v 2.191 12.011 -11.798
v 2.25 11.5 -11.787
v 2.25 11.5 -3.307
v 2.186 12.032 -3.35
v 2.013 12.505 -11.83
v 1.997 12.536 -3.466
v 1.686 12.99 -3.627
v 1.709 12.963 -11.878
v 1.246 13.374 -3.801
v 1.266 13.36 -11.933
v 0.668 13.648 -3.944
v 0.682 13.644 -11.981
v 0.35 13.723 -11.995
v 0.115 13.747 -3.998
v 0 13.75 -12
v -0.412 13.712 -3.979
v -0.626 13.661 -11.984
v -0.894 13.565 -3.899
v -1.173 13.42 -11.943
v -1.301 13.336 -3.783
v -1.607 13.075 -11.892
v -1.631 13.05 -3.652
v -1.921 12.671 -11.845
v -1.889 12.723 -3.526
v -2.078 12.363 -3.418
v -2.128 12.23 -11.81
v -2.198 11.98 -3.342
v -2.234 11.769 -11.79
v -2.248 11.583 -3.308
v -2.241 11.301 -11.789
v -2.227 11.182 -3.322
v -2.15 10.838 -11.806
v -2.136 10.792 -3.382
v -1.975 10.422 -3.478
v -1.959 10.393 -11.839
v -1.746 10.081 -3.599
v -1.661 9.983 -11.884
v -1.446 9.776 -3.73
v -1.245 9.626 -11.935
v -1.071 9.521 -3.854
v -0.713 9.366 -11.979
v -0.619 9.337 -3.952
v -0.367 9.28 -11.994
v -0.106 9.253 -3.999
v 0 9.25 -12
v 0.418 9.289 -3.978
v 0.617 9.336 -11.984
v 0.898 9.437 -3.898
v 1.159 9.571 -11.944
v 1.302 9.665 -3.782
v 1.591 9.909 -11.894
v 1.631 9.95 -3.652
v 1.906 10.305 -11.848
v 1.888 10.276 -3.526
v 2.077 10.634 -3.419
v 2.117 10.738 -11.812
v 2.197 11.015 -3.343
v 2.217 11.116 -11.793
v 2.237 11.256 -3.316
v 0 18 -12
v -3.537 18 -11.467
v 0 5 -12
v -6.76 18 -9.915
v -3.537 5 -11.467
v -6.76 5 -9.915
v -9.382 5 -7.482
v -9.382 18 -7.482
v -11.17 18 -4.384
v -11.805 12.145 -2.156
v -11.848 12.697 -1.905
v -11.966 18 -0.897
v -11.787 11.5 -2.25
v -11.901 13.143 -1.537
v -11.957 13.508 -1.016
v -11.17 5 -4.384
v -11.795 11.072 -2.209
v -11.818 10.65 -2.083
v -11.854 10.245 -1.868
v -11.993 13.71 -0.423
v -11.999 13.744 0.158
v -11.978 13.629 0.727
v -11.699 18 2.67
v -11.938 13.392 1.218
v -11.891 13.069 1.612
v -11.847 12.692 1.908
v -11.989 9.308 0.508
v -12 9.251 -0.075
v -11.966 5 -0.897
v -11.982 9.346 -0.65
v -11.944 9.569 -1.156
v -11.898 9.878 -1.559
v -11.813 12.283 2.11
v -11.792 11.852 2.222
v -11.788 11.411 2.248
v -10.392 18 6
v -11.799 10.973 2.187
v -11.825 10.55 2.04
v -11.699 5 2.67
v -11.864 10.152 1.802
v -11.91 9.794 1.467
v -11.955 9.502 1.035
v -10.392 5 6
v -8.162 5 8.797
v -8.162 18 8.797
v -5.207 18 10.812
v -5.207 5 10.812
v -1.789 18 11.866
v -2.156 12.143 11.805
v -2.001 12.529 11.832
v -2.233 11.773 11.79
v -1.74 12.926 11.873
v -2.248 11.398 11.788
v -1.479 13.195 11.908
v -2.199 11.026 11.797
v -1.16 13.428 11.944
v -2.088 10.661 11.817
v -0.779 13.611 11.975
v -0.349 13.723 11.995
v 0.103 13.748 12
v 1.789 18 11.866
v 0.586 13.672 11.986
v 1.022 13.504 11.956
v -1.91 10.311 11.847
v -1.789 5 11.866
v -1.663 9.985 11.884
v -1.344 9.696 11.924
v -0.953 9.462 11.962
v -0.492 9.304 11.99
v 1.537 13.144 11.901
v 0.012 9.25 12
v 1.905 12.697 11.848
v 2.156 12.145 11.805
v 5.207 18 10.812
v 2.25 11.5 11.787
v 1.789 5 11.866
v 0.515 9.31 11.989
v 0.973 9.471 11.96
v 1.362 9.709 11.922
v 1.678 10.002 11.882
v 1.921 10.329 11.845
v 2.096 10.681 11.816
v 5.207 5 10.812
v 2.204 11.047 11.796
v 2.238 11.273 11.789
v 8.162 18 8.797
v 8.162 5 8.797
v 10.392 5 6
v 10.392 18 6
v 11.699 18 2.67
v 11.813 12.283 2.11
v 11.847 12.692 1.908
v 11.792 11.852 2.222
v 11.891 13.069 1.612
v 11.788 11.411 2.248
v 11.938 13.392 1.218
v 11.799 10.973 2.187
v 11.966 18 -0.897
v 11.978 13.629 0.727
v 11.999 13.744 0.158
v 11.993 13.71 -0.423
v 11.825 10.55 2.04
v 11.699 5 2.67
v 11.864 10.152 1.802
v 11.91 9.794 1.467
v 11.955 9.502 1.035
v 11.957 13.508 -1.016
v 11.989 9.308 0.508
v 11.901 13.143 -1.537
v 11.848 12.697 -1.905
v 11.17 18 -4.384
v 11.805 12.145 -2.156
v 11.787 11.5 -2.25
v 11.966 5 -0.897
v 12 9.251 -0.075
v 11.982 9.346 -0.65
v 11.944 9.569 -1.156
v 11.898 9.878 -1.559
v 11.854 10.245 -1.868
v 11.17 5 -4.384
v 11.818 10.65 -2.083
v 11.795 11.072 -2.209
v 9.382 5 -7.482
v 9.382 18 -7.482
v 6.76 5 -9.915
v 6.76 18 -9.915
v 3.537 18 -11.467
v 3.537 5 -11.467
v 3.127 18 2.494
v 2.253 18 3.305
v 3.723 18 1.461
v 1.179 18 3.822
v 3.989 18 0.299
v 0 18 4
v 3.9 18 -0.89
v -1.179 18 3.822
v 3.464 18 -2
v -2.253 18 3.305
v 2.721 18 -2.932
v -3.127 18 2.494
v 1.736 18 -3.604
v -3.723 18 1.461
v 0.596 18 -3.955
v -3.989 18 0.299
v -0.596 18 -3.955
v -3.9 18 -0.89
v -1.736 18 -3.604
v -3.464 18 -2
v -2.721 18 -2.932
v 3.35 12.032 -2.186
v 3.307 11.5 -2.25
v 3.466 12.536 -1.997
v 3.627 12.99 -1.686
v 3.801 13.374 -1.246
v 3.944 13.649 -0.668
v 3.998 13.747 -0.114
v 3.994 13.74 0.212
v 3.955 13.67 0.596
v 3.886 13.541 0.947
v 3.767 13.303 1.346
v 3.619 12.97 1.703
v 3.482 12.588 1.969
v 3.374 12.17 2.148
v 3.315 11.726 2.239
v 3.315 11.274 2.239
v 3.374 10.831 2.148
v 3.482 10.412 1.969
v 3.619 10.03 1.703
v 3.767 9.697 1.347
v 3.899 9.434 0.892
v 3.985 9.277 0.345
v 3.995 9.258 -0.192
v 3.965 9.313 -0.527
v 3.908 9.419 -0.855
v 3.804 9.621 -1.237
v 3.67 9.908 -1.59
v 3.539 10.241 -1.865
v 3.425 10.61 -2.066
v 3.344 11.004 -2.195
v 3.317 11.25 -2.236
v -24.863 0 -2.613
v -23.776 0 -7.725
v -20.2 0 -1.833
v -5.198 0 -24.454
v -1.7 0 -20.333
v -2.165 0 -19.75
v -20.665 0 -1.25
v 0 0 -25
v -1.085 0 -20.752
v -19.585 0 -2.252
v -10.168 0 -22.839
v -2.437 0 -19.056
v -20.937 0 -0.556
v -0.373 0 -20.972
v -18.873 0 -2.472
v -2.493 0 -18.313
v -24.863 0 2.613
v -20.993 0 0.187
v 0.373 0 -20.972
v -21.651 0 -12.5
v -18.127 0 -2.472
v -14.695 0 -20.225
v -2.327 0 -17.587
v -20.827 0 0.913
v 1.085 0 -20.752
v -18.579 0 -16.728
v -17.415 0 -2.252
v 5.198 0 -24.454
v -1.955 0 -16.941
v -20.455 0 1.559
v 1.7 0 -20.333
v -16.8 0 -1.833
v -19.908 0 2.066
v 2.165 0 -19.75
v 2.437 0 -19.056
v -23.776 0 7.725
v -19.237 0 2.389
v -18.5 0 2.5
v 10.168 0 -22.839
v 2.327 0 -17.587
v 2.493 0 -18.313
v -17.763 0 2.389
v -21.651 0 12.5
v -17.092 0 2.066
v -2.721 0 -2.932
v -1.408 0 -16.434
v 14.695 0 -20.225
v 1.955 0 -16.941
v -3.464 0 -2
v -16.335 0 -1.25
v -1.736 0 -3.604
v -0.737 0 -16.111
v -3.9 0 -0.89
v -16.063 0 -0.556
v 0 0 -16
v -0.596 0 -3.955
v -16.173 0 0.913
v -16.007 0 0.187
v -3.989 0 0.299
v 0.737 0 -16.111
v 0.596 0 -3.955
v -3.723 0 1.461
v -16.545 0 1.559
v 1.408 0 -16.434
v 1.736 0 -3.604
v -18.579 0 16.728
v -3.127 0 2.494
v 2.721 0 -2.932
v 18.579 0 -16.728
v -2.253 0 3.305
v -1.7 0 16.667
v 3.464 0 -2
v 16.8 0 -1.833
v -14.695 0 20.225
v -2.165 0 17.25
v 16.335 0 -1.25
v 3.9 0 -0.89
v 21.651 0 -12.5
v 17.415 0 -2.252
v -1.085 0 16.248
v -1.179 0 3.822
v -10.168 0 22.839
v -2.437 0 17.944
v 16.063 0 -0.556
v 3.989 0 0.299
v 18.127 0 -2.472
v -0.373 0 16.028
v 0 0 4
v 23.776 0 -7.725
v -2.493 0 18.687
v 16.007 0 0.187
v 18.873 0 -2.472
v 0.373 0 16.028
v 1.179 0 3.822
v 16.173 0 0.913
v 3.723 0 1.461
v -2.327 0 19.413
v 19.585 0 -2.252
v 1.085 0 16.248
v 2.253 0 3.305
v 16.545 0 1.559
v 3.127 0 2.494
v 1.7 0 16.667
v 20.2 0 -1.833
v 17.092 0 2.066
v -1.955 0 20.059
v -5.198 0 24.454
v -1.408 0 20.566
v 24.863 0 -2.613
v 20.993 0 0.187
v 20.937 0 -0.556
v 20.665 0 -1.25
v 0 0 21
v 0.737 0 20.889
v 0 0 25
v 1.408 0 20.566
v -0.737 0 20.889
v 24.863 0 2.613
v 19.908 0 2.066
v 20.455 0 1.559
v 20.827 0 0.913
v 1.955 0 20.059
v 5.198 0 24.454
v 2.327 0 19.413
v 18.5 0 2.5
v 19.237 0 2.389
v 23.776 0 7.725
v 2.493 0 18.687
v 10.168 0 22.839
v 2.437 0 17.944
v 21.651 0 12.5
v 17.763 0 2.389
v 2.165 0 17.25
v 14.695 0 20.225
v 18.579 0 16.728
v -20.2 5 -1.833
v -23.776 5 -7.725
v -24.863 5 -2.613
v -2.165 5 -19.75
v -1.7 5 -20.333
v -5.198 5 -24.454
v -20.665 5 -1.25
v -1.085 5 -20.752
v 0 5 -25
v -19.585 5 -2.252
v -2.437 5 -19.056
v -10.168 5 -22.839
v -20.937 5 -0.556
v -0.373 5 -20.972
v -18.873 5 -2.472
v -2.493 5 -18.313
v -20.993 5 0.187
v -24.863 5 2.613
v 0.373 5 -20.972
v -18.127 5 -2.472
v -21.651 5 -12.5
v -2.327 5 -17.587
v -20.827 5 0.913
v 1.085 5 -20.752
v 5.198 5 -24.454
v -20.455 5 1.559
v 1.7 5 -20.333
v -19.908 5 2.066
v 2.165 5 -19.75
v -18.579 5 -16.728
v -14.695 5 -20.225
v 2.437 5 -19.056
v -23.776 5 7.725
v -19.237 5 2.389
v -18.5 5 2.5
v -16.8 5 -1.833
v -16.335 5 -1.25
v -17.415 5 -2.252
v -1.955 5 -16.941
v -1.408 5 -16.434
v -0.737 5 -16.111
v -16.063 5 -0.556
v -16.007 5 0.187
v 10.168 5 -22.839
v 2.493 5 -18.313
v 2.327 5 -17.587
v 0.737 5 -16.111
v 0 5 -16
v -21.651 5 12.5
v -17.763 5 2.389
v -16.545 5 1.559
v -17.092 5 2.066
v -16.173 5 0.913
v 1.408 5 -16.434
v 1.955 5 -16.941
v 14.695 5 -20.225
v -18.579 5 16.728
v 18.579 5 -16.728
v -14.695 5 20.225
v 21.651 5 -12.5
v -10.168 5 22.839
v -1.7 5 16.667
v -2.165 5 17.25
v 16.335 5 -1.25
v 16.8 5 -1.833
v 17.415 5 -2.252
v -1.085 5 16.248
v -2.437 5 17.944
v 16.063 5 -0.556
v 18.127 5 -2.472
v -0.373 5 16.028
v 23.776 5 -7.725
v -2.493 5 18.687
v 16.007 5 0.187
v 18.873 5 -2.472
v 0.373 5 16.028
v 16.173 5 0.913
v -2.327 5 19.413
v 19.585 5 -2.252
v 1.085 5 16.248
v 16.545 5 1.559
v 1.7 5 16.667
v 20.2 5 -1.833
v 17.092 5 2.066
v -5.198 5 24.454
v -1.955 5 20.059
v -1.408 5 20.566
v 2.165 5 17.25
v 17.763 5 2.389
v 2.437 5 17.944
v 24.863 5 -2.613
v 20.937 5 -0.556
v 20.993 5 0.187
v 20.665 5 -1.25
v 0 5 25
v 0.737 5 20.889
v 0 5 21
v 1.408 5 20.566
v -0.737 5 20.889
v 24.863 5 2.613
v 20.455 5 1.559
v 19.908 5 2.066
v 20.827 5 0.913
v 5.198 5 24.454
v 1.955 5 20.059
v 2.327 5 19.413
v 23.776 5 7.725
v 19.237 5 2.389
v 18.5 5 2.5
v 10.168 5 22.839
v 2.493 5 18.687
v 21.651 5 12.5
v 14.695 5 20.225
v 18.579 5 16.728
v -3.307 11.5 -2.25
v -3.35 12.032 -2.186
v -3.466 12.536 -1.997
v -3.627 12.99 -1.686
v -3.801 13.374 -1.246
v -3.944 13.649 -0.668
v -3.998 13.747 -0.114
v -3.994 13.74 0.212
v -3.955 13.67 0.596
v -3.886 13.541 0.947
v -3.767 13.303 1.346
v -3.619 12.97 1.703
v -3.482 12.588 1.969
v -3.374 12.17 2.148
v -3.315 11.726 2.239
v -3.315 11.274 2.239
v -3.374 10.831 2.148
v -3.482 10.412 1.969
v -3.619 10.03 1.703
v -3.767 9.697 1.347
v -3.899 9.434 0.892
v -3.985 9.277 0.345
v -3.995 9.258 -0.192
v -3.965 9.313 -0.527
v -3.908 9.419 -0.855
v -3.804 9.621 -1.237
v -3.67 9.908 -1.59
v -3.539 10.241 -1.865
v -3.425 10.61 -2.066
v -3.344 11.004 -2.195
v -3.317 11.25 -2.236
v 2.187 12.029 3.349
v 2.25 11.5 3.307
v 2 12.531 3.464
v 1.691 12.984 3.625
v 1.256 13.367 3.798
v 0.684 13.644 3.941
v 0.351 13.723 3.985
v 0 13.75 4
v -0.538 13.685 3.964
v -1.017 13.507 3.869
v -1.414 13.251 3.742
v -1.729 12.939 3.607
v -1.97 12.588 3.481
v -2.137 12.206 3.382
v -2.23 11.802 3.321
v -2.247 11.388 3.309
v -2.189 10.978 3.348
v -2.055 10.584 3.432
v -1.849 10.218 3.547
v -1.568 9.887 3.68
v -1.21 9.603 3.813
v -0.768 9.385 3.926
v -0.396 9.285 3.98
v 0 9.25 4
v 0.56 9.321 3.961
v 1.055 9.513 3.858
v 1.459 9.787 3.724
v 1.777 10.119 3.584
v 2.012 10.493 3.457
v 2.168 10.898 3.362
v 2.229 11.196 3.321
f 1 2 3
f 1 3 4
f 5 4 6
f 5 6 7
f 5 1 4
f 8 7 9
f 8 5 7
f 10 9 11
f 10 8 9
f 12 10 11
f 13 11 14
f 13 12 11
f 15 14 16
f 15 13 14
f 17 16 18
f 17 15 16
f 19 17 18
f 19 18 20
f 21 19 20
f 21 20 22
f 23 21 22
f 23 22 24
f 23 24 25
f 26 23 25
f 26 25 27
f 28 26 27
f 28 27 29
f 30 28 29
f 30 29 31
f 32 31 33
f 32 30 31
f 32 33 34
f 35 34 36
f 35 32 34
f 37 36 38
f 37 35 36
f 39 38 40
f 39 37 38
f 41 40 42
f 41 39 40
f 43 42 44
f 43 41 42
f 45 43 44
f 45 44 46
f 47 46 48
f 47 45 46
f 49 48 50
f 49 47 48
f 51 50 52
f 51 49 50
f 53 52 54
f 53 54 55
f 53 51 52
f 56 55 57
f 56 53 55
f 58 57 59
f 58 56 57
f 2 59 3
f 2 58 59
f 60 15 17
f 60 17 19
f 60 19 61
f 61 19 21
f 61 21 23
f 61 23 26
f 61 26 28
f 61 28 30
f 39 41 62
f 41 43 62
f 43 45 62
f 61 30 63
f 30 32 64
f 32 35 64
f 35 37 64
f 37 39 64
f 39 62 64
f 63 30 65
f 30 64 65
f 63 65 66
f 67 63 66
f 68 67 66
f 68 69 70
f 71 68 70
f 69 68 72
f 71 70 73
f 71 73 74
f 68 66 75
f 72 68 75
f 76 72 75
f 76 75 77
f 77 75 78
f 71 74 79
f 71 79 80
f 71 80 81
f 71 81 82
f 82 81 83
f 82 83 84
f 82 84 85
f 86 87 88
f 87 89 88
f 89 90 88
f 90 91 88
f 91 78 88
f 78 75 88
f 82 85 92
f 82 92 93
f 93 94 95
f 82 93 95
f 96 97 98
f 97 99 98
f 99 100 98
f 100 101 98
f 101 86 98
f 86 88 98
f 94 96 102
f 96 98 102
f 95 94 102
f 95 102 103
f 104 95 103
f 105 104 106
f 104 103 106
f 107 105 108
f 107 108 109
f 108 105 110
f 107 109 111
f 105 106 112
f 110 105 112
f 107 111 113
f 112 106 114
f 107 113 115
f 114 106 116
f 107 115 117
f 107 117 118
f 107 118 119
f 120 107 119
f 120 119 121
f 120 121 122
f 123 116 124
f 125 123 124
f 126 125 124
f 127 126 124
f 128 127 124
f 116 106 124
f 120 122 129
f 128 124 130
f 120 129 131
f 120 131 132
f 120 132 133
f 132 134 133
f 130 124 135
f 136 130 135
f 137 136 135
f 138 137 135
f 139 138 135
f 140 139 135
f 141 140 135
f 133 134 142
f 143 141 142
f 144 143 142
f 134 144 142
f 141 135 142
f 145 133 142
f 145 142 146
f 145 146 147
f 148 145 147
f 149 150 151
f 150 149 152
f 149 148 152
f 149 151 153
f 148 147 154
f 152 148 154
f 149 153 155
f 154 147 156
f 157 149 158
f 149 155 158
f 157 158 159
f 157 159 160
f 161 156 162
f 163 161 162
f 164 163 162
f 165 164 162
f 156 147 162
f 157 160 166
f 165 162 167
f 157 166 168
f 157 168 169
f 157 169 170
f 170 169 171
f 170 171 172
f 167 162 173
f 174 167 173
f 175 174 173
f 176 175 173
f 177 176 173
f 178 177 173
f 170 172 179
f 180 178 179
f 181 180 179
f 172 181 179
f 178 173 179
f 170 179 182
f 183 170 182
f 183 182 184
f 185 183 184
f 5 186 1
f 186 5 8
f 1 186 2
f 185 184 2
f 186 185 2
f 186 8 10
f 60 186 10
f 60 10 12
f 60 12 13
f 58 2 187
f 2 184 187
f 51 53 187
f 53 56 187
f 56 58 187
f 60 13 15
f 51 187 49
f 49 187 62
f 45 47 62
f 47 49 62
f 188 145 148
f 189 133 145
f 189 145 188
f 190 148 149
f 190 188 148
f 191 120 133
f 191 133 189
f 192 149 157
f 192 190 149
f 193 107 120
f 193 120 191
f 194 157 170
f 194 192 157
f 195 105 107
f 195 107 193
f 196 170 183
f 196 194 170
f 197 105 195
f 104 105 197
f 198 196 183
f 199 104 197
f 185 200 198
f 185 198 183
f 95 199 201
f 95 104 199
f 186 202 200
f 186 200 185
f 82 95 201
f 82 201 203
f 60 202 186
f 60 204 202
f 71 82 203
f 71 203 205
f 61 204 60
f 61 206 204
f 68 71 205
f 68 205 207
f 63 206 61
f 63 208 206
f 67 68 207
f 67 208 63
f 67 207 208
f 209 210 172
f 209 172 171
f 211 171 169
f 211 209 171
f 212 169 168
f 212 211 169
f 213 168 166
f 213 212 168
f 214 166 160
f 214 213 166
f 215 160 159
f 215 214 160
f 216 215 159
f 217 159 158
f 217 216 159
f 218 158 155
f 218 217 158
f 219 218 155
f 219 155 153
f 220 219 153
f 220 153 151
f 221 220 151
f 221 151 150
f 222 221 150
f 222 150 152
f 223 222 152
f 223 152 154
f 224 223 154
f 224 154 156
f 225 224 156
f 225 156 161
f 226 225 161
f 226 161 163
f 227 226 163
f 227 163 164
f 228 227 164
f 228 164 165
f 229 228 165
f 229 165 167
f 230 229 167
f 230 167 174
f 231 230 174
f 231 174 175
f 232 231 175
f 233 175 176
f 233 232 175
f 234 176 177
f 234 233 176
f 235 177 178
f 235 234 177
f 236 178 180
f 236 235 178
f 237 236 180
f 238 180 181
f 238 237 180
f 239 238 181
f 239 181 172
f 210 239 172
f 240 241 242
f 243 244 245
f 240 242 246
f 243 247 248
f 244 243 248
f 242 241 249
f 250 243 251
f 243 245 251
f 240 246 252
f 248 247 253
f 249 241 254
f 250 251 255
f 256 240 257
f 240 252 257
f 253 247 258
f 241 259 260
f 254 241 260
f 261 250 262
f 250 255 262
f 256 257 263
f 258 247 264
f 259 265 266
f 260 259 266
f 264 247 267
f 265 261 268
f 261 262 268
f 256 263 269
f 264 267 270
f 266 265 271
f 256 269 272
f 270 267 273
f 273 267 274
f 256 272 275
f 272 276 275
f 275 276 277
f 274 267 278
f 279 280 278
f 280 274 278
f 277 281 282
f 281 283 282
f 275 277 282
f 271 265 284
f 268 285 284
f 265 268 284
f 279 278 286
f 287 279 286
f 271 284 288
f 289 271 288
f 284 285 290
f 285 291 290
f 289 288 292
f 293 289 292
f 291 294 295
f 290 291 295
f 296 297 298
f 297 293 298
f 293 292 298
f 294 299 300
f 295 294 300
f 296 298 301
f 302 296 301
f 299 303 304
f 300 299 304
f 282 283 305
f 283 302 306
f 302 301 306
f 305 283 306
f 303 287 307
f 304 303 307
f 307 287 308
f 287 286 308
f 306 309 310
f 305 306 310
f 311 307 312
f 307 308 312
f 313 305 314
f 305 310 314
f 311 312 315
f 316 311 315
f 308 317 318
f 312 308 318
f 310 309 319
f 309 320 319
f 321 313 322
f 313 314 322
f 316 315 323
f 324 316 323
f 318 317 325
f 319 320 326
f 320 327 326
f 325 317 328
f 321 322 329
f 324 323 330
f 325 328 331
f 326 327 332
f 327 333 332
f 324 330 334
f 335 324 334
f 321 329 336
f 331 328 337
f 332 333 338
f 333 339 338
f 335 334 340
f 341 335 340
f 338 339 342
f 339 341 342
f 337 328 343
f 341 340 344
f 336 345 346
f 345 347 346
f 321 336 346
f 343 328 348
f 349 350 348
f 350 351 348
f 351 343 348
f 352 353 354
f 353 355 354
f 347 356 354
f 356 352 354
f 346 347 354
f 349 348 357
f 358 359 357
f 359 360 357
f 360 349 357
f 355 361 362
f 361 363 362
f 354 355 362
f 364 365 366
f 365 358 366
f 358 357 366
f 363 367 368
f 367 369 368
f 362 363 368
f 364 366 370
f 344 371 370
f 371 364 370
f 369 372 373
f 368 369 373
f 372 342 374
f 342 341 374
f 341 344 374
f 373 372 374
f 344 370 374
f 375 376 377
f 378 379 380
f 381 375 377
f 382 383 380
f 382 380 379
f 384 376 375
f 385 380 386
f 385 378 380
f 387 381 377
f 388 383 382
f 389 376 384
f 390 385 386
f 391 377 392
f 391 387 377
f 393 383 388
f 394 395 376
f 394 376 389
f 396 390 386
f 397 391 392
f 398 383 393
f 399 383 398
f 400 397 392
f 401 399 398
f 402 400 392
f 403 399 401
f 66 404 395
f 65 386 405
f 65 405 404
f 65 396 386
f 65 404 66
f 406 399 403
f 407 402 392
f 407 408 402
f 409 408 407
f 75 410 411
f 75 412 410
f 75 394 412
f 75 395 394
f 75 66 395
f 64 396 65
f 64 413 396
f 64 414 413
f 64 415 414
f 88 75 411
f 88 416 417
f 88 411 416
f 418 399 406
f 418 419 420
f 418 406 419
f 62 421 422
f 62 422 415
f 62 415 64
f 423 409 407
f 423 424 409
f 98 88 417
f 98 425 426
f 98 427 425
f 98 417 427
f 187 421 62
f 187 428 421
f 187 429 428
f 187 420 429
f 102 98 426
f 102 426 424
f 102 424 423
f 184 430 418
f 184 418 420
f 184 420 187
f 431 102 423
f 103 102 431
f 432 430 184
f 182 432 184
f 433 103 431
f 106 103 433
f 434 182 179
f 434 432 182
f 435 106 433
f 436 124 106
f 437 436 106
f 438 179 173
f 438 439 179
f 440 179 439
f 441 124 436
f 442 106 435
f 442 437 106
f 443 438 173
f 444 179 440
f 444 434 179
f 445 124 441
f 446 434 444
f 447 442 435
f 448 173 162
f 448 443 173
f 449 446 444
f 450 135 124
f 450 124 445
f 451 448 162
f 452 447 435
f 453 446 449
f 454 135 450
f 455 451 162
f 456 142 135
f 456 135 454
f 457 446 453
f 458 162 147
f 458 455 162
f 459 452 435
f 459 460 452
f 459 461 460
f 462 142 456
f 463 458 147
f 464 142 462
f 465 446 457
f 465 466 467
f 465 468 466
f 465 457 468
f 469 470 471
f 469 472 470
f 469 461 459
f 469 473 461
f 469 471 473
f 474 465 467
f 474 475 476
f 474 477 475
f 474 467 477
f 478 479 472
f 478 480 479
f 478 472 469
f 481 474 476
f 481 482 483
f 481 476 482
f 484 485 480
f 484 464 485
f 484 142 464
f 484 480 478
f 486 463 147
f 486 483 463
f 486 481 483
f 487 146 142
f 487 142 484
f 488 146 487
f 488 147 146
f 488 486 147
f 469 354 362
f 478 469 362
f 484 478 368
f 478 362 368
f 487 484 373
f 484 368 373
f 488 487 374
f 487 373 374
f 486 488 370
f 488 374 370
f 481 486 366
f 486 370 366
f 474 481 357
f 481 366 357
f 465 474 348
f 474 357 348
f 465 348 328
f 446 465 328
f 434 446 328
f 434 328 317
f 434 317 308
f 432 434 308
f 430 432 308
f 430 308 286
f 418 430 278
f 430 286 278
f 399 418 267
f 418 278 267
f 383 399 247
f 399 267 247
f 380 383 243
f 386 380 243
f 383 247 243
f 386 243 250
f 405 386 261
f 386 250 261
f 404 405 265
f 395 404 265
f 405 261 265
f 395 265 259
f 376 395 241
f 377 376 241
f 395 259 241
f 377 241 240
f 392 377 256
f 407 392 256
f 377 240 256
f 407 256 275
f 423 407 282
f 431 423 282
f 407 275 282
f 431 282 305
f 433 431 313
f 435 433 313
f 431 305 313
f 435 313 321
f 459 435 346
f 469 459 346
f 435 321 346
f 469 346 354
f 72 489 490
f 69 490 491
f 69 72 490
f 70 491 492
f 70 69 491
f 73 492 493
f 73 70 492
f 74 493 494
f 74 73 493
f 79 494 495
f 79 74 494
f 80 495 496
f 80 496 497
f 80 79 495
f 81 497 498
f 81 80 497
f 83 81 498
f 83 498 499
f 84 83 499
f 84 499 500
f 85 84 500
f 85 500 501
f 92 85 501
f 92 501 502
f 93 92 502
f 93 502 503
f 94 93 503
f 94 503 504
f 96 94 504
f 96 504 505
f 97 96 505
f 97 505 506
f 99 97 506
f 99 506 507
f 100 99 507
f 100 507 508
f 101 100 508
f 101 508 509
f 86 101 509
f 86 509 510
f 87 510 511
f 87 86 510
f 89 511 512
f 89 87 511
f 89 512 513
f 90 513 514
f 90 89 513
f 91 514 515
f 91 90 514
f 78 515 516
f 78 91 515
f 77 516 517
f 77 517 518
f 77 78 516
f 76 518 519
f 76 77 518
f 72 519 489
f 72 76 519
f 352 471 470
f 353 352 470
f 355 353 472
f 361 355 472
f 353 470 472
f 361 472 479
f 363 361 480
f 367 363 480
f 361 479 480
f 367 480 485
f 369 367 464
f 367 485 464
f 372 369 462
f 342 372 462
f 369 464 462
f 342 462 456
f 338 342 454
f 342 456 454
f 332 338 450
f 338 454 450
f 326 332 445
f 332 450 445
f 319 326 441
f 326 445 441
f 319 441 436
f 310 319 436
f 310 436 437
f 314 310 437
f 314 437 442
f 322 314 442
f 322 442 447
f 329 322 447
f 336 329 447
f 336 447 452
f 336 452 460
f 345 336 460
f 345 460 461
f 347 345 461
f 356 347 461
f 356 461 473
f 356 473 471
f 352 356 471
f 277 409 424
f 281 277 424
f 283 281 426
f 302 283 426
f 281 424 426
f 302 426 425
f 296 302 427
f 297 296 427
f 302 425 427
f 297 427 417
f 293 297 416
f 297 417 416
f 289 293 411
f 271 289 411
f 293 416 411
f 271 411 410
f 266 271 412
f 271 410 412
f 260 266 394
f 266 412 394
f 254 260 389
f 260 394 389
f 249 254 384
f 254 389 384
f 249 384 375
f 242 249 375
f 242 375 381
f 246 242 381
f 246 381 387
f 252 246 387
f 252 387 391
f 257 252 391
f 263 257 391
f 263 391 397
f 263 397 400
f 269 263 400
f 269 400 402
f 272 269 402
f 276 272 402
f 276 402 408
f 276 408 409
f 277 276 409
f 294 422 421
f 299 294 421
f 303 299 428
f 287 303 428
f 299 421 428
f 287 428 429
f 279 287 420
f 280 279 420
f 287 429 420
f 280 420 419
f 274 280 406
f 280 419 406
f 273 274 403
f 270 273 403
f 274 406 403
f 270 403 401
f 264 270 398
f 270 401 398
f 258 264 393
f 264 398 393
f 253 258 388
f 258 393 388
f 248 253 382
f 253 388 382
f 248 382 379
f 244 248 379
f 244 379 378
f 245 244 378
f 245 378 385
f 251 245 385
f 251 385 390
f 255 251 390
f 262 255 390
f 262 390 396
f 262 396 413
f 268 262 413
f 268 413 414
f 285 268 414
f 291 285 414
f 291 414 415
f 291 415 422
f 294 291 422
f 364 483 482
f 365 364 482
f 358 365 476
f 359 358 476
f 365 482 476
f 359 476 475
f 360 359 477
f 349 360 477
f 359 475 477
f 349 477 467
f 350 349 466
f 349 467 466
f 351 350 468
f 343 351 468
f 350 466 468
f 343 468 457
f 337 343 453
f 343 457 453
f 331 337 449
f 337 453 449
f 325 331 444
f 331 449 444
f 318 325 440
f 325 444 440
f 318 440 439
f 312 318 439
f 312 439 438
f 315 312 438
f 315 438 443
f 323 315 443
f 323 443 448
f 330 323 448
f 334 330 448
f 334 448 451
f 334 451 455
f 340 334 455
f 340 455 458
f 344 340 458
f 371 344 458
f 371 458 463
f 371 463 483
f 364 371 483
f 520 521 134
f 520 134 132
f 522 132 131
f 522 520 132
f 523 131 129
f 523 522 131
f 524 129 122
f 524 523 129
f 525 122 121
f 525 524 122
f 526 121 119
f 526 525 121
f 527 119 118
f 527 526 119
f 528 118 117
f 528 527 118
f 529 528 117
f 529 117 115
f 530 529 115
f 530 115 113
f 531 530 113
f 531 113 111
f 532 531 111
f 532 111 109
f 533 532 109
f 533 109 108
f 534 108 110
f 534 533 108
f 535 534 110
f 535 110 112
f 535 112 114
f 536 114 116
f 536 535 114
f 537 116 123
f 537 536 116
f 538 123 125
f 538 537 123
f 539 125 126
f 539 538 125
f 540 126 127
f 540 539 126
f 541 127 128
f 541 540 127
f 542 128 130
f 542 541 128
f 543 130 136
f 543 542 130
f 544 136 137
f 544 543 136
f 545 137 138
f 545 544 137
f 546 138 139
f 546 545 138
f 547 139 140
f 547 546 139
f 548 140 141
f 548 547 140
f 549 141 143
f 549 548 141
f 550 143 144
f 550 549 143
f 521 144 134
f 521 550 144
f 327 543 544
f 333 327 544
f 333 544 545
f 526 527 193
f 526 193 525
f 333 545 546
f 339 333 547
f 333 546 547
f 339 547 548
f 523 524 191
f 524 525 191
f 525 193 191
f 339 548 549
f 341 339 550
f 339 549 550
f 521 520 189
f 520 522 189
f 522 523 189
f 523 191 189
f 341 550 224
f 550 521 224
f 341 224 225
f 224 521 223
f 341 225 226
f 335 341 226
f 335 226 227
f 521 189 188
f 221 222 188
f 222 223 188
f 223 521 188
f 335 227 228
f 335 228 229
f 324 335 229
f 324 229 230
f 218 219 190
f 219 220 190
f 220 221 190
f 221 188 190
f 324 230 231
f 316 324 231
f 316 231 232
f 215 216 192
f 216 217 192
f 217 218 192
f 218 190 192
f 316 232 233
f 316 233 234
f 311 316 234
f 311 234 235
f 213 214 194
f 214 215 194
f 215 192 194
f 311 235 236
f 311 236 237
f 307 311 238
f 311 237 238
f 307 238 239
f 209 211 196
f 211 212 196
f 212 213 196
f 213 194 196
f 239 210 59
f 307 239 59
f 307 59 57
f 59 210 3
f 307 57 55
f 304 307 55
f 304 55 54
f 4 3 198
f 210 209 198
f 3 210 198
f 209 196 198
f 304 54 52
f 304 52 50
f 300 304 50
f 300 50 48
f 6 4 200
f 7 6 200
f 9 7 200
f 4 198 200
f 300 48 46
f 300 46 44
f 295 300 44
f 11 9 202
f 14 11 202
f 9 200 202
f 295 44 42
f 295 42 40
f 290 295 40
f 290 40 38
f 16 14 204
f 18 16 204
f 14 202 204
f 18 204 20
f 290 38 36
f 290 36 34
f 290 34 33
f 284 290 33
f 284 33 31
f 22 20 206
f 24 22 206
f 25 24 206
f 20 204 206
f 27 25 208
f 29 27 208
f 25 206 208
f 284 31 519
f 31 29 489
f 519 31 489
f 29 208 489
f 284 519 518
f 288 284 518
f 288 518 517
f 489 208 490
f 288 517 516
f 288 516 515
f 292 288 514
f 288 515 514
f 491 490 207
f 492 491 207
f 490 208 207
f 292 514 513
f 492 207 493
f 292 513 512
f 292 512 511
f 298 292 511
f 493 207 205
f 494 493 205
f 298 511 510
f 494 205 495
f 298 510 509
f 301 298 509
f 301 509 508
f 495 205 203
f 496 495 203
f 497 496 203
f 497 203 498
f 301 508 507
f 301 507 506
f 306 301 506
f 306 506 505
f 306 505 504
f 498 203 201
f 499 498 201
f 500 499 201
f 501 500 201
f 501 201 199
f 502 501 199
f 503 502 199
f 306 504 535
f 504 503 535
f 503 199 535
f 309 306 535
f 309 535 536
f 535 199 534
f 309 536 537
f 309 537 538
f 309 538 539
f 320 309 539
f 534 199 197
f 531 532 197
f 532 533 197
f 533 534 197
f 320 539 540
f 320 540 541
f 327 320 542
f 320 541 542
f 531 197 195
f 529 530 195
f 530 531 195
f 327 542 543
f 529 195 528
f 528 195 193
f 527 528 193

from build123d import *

# Parameters (mm, degrees)
SKETCH_1_R               = 25
EXTRUDE_1_DEPTH          = 5
SKETCH_2_R               = 12
EXTRUDE_2_DEPTH          = 13
SKETCH_3_R               = 4
CUT_EXTRUDE_1_DEPTH      = 40.67366885
SKETCH_4_R               = 2.5
CUT_EXTRUDE_2_DEPTH      = 38.669616404
CUT_EXTRUDE_3_DEPTH      = 40.67366885
CUT_EXTRUDE_3_DEPTH_BACK = 40.67366885
SKETCH_5_R               = 2.25
CUT_EXTRUDE_4_DEPTH      = 40.673668895
CUT_EXTRUDE_4_DEPTH_BACK = 40.673668895
SKETCH_6_R               = 2.25


with BuildPart() as part:
    # 草图1 → 凸台-拉伸1 (new body)
    with BuildSketch(Plane(origin=(0, 0, 0), x_dir=(1, 0, 0), z_dir=(0, 1, 0))):
        with Locations(Location((0, 0, 0), (0, 0, 270))):
            Circle(SKETCH_1_R)
    extrude(amount=EXTRUDE_1_DEPTH)

    # 草图2 → 凸台-拉伸2 (add)
    with BuildSketch(Plane(origin=(0, 5, 0), x_dir=(1, 0, 0), z_dir=(0, 1, 0))):
        with Locations(Location((0, 0, 0), (0, 0, 90))):
            Circle(SKETCH_2_R)
    extrude(amount=EXTRUDE_2_DEPTH)

    # 草图3 → 切除-拉伸1 (cut, through all)
    with BuildSketch(Plane(origin=(0, 18, 0), x_dir=(1, 0, 0), z_dir=(0, 1, 0))):
        with Locations(Location((0, 0, 0), (0, 0, 270))):
            Circle(SKETCH_3_R)
    extrude(amount=-CUT_EXTRUDE_1_DEPTH, mode=Mode.SUBTRACT)

    # 草图4 → 切除-拉伸2 (cut, through all)
    with BuildSketch(Plane(origin=(0, 5, 0), x_dir=(1, 0, 0), z_dir=(0, 1, 0))):
        with Locations(Location((0, 18.5, 0), (0, 0, 270))):
            Circle(SKETCH_4_R)
        with Locations(Location((18.5, 0, 0), (0, 0, 270))):
            Circle(SKETCH_4_R)
        with Locations(Location((0, -18.5, 0), (0, 0, 270))):
            Circle(SKETCH_4_R)
        with Locations(Location((-18.5, 0, 0), (0, 0, 270))):
            Circle(SKETCH_4_R)
    extrude(amount=-CUT_EXTRUDE_2_DEPTH, mode=Mode.SUBTRACT)

    # 草图5 → 切除-拉伸3 (cut, two sides: drawn at the far end of the back side and taken through both)
    with BuildSketch(Plane(origin=(0, 0, 0), x_dir=(0, 0, -1), z_dir=(1, 0, 0)).offset(-CUT_EXTRUDE_3_DEPTH_BACK)):
        with Locations((0, 11.5)):
            Circle(SKETCH_5_R)
    extrude(amount=CUT_EXTRUDE_3_DEPTH + CUT_EXTRUDE_3_DEPTH_BACK, mode=Mode.SUBTRACT)

    # 草图6 → 切除-拉伸4 (cut, two sides: drawn at the far end of the back side and taken through both)
    with BuildSketch(Plane.XY.offset(-CUT_EXTRUDE_4_DEPTH_BACK)):
        with Locations((0, 11.5)):
            Circle(SKETCH_6_R)
    extrude(amount=CUT_EXTRUDE_4_DEPTH + CUT_EXTRUDE_4_DEPTH_BACK, mode=Mode.SUBTRACT)


solid = part.part
